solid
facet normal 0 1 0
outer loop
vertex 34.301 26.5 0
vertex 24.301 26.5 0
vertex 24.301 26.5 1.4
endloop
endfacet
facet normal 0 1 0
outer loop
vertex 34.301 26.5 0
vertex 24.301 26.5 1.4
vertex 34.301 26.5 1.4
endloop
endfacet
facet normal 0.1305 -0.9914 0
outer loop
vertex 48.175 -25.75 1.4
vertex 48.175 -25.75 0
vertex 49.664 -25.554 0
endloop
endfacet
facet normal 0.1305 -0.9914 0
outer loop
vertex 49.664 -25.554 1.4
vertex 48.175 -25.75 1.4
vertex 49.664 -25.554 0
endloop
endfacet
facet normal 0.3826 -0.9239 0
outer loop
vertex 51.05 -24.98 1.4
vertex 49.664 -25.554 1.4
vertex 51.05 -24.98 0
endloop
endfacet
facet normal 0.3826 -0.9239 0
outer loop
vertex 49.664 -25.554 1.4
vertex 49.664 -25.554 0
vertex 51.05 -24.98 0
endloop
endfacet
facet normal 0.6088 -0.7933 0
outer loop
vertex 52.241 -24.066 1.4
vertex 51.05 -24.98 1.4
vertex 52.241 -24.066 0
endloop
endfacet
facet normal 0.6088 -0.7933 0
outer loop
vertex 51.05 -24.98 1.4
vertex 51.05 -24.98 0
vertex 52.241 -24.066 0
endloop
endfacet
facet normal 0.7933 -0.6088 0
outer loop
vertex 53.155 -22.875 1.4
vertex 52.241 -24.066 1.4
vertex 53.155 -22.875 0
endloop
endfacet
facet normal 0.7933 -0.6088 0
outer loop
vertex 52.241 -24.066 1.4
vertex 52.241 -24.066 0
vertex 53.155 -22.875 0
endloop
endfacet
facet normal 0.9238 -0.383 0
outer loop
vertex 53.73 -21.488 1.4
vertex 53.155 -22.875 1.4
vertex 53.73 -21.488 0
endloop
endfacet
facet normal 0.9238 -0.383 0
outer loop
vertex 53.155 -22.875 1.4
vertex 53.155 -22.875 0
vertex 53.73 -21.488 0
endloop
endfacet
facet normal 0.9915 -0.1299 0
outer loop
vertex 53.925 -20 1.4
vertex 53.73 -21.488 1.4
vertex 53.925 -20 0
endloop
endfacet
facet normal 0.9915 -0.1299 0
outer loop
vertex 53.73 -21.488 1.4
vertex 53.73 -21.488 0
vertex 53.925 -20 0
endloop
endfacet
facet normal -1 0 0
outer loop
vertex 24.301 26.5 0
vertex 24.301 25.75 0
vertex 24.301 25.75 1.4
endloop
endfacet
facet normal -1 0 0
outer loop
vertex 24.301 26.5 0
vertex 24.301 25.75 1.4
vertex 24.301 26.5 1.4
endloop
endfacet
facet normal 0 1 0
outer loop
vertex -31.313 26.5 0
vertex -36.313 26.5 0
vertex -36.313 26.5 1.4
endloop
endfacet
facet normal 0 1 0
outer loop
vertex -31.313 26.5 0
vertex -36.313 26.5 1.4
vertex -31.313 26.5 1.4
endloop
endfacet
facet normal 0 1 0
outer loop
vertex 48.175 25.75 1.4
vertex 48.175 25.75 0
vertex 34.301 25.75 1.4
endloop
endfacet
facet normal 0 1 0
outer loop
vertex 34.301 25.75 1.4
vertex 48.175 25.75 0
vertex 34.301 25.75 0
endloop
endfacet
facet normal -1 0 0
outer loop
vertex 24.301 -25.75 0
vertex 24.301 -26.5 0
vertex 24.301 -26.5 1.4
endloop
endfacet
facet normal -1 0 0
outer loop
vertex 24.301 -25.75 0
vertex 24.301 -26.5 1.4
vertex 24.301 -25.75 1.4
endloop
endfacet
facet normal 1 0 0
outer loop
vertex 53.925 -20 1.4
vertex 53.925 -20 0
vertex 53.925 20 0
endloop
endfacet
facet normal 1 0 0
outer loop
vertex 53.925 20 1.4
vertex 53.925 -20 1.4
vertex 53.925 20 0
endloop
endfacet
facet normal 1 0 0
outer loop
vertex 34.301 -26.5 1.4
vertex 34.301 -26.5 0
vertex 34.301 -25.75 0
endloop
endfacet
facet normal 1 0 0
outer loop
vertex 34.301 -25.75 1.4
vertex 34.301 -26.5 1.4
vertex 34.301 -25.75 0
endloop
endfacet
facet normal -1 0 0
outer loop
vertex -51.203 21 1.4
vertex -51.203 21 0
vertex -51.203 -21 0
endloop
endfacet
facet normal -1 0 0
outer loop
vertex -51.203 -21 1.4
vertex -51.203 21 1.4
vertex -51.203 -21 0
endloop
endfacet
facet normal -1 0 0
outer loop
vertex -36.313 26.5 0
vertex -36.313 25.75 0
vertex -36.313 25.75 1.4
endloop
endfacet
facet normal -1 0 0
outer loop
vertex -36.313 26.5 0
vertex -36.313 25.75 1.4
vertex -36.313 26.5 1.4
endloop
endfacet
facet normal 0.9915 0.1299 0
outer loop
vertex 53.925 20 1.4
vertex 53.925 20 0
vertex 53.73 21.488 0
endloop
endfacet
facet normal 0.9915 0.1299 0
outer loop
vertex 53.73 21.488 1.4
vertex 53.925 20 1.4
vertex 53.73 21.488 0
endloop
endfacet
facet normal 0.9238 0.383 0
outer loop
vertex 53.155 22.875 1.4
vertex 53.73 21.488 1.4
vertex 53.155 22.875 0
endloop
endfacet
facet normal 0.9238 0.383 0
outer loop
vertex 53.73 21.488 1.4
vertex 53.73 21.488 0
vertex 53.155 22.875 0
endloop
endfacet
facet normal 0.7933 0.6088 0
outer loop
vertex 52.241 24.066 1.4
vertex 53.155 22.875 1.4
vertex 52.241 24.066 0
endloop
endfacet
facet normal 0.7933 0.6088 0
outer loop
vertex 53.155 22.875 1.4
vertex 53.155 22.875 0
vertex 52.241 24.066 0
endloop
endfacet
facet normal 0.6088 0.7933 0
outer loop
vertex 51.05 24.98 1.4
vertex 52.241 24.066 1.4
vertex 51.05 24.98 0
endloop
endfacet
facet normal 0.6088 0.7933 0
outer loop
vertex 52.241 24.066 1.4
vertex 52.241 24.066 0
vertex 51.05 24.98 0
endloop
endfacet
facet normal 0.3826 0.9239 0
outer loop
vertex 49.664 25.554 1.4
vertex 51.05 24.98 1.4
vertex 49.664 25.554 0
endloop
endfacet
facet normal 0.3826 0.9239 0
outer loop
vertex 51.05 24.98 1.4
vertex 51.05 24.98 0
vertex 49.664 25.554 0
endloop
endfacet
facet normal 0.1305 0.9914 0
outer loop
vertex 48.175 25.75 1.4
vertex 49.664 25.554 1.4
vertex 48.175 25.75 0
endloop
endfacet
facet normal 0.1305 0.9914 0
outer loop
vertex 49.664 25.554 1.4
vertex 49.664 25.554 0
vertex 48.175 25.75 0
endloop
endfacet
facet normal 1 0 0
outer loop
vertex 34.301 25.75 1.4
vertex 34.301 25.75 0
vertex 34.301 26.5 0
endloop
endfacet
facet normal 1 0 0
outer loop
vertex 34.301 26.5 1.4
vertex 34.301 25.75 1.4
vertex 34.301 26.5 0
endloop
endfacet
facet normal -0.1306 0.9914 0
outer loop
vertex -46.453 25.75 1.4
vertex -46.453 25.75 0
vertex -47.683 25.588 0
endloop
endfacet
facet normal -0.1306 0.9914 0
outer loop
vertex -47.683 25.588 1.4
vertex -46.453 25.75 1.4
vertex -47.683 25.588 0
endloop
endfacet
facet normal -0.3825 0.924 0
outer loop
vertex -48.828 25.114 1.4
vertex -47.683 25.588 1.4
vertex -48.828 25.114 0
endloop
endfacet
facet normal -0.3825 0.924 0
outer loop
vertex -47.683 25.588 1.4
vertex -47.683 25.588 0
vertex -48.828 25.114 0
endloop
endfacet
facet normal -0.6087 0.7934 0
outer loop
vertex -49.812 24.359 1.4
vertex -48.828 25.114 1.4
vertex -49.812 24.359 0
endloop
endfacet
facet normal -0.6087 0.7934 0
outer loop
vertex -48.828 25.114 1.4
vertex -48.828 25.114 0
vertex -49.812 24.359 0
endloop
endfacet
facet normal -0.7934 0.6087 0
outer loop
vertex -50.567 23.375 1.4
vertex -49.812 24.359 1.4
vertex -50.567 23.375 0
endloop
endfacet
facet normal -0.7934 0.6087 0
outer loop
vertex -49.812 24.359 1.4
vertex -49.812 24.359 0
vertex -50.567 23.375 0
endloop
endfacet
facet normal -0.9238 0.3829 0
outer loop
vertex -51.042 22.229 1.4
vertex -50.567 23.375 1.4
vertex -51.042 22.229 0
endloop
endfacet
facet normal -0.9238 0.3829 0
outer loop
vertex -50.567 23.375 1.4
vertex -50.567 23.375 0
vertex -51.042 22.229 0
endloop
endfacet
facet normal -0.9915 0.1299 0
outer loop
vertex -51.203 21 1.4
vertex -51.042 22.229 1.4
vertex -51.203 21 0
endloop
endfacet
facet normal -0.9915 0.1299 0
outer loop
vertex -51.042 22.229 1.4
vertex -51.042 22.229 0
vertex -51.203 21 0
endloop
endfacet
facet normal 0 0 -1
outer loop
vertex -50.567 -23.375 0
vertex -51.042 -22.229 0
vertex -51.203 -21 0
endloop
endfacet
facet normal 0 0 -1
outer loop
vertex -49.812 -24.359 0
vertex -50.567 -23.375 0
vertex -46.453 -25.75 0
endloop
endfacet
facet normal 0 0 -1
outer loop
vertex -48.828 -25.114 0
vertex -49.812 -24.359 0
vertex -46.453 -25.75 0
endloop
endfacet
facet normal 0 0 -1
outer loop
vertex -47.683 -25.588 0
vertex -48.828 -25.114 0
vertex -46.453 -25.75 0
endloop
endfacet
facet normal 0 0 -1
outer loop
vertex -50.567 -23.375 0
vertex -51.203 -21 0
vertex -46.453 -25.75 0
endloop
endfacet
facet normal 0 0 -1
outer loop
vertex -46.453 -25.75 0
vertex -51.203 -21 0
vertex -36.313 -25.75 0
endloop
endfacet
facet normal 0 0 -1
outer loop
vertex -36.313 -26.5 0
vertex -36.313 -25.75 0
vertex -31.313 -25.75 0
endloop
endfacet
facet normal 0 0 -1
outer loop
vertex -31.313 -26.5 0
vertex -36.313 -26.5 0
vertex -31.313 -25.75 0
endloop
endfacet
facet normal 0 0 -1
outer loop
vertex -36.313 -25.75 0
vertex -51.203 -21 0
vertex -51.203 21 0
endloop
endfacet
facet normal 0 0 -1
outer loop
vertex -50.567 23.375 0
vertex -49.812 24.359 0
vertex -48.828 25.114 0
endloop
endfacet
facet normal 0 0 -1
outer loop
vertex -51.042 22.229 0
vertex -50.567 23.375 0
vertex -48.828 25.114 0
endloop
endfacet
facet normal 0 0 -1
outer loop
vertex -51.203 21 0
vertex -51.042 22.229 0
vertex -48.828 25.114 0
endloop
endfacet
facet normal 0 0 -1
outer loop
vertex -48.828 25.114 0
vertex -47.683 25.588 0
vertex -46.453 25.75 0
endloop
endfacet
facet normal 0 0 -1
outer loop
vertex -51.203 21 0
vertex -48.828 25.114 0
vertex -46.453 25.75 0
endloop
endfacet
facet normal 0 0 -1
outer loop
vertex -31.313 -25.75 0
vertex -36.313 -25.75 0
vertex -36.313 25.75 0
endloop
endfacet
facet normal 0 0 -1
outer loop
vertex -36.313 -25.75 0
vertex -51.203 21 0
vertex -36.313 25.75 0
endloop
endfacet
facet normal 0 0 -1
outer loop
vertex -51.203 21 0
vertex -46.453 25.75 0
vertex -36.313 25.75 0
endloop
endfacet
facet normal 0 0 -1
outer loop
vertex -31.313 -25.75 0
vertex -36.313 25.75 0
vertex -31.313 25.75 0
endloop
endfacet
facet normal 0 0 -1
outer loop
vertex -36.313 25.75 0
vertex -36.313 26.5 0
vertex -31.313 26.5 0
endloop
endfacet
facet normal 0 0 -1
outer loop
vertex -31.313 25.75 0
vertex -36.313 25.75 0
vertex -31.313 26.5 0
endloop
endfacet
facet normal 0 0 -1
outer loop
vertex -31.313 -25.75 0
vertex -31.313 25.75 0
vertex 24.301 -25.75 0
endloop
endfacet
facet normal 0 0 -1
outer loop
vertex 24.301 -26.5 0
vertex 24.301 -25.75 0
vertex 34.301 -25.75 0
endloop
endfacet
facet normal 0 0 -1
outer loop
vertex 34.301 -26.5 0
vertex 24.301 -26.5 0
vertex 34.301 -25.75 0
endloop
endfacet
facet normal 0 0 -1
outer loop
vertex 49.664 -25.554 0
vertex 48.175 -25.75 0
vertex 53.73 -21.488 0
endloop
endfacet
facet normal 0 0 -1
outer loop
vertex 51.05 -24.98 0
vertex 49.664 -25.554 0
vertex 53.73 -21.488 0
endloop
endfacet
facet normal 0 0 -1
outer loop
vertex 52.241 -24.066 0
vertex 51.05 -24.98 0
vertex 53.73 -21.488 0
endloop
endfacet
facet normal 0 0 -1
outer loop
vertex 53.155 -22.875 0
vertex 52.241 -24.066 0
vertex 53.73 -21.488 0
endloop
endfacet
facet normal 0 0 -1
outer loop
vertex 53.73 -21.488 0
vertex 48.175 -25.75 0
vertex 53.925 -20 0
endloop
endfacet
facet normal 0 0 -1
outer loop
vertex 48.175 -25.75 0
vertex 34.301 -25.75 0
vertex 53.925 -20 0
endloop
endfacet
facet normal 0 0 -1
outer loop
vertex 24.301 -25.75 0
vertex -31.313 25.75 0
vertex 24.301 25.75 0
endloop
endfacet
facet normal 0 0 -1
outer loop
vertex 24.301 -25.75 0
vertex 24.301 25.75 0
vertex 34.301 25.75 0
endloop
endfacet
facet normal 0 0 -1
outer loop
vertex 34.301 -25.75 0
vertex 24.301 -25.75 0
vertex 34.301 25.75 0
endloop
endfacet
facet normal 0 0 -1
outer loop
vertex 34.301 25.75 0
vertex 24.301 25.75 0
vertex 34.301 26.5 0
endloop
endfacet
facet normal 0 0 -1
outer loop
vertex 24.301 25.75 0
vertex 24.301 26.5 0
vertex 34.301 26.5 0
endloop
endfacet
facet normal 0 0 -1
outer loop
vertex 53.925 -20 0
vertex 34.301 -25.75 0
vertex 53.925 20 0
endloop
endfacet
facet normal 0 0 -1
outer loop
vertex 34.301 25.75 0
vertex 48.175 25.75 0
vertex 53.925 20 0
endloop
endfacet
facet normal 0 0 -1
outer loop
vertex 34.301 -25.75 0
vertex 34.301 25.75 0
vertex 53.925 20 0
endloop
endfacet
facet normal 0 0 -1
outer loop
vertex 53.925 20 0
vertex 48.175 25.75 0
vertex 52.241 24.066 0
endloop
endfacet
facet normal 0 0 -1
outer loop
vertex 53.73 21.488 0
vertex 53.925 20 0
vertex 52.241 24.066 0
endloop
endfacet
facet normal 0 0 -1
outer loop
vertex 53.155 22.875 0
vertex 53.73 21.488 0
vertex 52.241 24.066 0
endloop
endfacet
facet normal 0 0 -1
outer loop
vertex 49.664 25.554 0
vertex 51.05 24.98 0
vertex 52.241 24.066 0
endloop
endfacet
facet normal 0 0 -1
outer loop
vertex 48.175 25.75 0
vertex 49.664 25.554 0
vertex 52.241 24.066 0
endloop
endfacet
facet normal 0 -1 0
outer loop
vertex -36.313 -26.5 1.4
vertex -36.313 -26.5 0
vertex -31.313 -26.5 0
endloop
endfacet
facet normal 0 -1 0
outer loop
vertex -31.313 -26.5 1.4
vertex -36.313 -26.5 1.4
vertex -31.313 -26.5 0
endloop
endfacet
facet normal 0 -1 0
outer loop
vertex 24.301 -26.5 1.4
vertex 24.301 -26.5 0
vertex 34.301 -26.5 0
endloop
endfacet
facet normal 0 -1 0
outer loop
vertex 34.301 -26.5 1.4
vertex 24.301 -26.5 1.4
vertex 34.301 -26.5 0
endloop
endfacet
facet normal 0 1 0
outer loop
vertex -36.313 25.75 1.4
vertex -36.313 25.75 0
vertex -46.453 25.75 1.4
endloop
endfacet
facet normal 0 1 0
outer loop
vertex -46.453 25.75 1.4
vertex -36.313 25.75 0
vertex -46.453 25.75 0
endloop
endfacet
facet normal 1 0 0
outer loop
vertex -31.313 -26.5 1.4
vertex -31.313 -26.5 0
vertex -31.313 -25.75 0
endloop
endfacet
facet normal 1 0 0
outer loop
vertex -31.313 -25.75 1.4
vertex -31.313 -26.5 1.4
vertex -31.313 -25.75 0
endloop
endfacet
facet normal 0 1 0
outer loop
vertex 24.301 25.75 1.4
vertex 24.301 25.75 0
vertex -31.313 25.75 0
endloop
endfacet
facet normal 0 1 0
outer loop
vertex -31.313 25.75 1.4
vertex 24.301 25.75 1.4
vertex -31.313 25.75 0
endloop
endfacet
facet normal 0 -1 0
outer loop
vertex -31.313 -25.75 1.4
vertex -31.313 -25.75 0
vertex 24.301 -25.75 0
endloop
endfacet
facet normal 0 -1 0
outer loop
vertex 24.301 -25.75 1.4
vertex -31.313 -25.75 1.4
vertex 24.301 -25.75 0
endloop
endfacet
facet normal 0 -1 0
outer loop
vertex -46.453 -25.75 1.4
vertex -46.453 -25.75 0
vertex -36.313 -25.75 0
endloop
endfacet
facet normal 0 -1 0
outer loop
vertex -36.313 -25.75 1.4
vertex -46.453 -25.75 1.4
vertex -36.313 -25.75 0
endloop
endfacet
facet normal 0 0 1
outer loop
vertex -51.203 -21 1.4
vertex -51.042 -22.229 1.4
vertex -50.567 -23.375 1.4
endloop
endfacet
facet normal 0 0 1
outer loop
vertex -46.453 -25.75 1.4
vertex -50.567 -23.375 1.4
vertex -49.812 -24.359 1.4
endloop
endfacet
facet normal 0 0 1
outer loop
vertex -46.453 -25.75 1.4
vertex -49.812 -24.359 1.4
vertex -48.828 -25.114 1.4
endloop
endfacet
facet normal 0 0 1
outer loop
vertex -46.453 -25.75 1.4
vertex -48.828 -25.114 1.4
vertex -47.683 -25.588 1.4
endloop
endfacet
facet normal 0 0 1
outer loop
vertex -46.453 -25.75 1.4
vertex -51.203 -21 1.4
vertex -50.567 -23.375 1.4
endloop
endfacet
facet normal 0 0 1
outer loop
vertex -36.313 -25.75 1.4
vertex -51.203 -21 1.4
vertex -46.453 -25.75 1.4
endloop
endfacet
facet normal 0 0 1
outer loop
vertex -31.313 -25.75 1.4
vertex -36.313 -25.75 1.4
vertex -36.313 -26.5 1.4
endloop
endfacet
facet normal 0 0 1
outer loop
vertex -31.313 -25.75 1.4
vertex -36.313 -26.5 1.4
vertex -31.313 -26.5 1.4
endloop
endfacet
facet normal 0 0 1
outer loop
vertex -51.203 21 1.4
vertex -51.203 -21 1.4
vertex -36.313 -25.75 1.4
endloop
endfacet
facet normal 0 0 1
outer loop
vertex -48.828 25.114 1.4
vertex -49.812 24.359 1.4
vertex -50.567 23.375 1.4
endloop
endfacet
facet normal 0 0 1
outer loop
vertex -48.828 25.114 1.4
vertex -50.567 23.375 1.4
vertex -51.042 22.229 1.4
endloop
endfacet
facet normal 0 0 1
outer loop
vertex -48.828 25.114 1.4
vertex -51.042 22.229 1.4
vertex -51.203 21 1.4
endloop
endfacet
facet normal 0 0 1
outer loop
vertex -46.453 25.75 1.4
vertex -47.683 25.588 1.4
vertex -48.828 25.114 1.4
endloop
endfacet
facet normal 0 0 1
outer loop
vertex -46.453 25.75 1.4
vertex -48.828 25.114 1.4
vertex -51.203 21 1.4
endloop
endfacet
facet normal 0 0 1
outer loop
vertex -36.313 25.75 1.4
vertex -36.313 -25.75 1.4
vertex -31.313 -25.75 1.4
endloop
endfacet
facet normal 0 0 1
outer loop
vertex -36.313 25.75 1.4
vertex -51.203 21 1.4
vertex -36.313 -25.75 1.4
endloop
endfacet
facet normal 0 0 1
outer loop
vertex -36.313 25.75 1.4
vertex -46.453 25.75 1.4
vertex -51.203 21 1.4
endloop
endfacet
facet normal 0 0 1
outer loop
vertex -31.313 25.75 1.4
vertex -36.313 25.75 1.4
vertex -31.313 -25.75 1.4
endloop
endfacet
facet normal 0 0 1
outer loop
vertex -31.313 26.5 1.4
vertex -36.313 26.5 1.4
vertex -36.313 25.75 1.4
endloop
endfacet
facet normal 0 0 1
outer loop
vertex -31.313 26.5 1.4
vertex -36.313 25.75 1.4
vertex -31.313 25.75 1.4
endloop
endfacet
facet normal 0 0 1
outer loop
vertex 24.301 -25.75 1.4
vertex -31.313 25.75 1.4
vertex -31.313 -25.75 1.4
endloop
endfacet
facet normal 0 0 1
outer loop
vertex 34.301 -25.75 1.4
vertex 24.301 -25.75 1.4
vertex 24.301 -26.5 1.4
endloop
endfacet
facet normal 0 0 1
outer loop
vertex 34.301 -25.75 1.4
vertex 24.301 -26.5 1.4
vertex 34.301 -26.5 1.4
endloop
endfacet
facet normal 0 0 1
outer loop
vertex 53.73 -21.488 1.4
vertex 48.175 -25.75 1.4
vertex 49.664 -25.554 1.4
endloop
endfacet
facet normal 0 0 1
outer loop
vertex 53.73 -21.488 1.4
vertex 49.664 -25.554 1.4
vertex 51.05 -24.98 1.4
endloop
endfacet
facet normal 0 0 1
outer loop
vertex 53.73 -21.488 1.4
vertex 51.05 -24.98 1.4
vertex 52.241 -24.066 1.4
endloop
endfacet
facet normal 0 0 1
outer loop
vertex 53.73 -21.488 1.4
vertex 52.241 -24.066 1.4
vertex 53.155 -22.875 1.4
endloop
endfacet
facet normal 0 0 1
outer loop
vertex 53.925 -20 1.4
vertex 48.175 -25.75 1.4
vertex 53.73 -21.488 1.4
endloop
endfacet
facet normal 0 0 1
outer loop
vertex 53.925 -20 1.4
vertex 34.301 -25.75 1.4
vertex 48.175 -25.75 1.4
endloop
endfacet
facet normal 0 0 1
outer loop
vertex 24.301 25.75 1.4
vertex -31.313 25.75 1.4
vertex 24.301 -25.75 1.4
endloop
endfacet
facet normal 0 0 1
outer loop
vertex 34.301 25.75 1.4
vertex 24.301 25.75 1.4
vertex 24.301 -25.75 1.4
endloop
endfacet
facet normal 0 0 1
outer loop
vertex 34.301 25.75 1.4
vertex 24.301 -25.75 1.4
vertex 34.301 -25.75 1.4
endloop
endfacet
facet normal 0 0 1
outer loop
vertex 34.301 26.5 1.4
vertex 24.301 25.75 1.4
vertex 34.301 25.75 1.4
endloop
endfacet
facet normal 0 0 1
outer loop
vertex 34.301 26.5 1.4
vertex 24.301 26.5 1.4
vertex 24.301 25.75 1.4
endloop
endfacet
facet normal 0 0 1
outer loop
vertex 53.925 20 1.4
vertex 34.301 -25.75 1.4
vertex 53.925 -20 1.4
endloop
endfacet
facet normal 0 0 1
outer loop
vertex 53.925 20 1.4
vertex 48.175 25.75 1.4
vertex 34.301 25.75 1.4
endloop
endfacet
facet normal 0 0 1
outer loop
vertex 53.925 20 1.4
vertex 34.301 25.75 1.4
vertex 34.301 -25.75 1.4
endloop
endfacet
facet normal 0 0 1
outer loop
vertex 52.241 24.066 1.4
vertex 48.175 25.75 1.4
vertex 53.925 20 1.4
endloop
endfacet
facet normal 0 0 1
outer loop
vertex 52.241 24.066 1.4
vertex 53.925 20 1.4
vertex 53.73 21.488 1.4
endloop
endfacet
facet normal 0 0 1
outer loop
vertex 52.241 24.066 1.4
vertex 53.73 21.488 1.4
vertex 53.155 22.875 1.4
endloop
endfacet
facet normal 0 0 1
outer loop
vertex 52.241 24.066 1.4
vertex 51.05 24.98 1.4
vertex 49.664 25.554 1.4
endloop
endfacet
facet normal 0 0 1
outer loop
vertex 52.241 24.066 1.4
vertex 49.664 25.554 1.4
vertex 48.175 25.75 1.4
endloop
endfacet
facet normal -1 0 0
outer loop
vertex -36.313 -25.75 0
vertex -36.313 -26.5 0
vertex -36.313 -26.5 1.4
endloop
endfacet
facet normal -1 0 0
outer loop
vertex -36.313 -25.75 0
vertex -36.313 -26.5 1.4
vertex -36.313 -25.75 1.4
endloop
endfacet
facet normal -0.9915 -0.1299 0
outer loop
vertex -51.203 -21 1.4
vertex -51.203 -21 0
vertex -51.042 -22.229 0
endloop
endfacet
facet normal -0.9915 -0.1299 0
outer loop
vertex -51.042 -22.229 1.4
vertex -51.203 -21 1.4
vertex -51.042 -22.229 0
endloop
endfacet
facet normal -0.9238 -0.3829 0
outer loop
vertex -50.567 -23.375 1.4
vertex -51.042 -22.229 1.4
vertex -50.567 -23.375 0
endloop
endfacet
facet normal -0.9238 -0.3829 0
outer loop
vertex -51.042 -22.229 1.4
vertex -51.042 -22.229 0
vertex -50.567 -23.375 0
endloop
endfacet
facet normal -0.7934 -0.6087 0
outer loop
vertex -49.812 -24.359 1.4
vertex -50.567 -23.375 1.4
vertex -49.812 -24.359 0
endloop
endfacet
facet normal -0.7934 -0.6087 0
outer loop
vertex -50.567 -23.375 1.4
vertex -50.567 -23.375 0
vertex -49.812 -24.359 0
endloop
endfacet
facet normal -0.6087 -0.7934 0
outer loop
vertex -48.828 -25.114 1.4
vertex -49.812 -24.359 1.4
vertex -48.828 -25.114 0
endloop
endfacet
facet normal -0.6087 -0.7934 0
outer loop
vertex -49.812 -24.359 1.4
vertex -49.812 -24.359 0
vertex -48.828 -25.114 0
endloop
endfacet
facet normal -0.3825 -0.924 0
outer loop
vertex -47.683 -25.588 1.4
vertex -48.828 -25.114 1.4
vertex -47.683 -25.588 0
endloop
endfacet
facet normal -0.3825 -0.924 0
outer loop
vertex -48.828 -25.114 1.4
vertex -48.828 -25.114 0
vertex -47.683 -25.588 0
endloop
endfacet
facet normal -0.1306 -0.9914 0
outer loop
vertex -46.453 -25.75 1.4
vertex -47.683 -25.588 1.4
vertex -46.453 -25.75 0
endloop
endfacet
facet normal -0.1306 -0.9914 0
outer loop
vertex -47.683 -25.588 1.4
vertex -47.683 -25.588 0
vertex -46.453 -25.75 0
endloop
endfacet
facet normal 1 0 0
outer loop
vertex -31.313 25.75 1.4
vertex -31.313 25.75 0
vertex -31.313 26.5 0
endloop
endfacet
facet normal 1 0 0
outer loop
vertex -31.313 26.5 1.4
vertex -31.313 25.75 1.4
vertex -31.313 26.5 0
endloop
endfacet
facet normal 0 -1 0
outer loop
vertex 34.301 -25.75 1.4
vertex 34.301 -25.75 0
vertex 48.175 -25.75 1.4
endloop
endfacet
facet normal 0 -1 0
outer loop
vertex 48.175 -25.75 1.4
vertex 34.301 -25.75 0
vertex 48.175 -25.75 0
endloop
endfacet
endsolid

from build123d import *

# Parameters (mm, degrees)
F0_W     = 55.6136657298
F0_H     = 51.5
F0_W_2   = 5
F0_W_3   = 10
F0_H_2   = 0.75
F1_DEPTH = 1.4


with BuildPart() as f1:
    # F0 (on Top) → F1 (new body)
    with BuildSketch(Plane.XY):
        with Locations((-3.5062433155, 0)):
            Rectangle(F0_W, F0_H)
        with Locations((-33.8130761804, 0)):
            Rectangle(F0_W_2, F0_H)
        with BuildLine():
            ThreePointArc((-51.2033691825, -21), (-49.8121263931, -24.3587572106), (-46.4533691825, -25.75))
            Line((-46.4533691825, -25.75), (-36.3130761804, -25.75))
            Line((-36.3130761804, -25.75), (-36.3130761804, 25.75))
            Line((-36.3130761804, 25.75), (-46.4533691825, 25.75))
            ThreePointArc((-46.4533691825, 25.75), (-49.8121263931, 24.3587572106), (-51.2033691825, 21))
            Line((-51.2033691825, 21), (-51.2033691825, -21))
        make_face()
        with Locations((29.3005895494, 0)):
            Rectangle(F0_W_3, F0_H)
        with BuildLine():
            Line((34.3005895494, 25.75), (34.3005895494, -25.75))
            Line((34.3005895494, -25.75), (48.1754575549, -25.75))
            ThreePointArc((48.1754575549, -25.75), (52.2413215467, -24.0658639918), (53.9254575549, -20))
            Line((53.9254575549, -20), (53.9254575549, 20))
            ThreePointArc((53.9254575549, 20), (52.2413215467, 24.0658639918), (48.1754575549, 25.75))
            Line((48.1754575549, 25.75), (34.3005895494, 25.75))
        make_face()
        with Locations((29.3005895494, -26.125)):
            Rectangle(F0_W_3, F0_H_2)
        with Locations((29.3005895494, 26.125)):
            Rectangle(F0_W_3, F0_H_2)
        with Locations((-33.8130761804, 26.125)):
            Rectangle(F0_W_2, F0_H_2)
        with Locations((-33.8130761804, -26.125)):
            Rectangle(F0_W_2, F0_H_2)
    extrude(amount=F1_DEPTH)


solid = f1.part
